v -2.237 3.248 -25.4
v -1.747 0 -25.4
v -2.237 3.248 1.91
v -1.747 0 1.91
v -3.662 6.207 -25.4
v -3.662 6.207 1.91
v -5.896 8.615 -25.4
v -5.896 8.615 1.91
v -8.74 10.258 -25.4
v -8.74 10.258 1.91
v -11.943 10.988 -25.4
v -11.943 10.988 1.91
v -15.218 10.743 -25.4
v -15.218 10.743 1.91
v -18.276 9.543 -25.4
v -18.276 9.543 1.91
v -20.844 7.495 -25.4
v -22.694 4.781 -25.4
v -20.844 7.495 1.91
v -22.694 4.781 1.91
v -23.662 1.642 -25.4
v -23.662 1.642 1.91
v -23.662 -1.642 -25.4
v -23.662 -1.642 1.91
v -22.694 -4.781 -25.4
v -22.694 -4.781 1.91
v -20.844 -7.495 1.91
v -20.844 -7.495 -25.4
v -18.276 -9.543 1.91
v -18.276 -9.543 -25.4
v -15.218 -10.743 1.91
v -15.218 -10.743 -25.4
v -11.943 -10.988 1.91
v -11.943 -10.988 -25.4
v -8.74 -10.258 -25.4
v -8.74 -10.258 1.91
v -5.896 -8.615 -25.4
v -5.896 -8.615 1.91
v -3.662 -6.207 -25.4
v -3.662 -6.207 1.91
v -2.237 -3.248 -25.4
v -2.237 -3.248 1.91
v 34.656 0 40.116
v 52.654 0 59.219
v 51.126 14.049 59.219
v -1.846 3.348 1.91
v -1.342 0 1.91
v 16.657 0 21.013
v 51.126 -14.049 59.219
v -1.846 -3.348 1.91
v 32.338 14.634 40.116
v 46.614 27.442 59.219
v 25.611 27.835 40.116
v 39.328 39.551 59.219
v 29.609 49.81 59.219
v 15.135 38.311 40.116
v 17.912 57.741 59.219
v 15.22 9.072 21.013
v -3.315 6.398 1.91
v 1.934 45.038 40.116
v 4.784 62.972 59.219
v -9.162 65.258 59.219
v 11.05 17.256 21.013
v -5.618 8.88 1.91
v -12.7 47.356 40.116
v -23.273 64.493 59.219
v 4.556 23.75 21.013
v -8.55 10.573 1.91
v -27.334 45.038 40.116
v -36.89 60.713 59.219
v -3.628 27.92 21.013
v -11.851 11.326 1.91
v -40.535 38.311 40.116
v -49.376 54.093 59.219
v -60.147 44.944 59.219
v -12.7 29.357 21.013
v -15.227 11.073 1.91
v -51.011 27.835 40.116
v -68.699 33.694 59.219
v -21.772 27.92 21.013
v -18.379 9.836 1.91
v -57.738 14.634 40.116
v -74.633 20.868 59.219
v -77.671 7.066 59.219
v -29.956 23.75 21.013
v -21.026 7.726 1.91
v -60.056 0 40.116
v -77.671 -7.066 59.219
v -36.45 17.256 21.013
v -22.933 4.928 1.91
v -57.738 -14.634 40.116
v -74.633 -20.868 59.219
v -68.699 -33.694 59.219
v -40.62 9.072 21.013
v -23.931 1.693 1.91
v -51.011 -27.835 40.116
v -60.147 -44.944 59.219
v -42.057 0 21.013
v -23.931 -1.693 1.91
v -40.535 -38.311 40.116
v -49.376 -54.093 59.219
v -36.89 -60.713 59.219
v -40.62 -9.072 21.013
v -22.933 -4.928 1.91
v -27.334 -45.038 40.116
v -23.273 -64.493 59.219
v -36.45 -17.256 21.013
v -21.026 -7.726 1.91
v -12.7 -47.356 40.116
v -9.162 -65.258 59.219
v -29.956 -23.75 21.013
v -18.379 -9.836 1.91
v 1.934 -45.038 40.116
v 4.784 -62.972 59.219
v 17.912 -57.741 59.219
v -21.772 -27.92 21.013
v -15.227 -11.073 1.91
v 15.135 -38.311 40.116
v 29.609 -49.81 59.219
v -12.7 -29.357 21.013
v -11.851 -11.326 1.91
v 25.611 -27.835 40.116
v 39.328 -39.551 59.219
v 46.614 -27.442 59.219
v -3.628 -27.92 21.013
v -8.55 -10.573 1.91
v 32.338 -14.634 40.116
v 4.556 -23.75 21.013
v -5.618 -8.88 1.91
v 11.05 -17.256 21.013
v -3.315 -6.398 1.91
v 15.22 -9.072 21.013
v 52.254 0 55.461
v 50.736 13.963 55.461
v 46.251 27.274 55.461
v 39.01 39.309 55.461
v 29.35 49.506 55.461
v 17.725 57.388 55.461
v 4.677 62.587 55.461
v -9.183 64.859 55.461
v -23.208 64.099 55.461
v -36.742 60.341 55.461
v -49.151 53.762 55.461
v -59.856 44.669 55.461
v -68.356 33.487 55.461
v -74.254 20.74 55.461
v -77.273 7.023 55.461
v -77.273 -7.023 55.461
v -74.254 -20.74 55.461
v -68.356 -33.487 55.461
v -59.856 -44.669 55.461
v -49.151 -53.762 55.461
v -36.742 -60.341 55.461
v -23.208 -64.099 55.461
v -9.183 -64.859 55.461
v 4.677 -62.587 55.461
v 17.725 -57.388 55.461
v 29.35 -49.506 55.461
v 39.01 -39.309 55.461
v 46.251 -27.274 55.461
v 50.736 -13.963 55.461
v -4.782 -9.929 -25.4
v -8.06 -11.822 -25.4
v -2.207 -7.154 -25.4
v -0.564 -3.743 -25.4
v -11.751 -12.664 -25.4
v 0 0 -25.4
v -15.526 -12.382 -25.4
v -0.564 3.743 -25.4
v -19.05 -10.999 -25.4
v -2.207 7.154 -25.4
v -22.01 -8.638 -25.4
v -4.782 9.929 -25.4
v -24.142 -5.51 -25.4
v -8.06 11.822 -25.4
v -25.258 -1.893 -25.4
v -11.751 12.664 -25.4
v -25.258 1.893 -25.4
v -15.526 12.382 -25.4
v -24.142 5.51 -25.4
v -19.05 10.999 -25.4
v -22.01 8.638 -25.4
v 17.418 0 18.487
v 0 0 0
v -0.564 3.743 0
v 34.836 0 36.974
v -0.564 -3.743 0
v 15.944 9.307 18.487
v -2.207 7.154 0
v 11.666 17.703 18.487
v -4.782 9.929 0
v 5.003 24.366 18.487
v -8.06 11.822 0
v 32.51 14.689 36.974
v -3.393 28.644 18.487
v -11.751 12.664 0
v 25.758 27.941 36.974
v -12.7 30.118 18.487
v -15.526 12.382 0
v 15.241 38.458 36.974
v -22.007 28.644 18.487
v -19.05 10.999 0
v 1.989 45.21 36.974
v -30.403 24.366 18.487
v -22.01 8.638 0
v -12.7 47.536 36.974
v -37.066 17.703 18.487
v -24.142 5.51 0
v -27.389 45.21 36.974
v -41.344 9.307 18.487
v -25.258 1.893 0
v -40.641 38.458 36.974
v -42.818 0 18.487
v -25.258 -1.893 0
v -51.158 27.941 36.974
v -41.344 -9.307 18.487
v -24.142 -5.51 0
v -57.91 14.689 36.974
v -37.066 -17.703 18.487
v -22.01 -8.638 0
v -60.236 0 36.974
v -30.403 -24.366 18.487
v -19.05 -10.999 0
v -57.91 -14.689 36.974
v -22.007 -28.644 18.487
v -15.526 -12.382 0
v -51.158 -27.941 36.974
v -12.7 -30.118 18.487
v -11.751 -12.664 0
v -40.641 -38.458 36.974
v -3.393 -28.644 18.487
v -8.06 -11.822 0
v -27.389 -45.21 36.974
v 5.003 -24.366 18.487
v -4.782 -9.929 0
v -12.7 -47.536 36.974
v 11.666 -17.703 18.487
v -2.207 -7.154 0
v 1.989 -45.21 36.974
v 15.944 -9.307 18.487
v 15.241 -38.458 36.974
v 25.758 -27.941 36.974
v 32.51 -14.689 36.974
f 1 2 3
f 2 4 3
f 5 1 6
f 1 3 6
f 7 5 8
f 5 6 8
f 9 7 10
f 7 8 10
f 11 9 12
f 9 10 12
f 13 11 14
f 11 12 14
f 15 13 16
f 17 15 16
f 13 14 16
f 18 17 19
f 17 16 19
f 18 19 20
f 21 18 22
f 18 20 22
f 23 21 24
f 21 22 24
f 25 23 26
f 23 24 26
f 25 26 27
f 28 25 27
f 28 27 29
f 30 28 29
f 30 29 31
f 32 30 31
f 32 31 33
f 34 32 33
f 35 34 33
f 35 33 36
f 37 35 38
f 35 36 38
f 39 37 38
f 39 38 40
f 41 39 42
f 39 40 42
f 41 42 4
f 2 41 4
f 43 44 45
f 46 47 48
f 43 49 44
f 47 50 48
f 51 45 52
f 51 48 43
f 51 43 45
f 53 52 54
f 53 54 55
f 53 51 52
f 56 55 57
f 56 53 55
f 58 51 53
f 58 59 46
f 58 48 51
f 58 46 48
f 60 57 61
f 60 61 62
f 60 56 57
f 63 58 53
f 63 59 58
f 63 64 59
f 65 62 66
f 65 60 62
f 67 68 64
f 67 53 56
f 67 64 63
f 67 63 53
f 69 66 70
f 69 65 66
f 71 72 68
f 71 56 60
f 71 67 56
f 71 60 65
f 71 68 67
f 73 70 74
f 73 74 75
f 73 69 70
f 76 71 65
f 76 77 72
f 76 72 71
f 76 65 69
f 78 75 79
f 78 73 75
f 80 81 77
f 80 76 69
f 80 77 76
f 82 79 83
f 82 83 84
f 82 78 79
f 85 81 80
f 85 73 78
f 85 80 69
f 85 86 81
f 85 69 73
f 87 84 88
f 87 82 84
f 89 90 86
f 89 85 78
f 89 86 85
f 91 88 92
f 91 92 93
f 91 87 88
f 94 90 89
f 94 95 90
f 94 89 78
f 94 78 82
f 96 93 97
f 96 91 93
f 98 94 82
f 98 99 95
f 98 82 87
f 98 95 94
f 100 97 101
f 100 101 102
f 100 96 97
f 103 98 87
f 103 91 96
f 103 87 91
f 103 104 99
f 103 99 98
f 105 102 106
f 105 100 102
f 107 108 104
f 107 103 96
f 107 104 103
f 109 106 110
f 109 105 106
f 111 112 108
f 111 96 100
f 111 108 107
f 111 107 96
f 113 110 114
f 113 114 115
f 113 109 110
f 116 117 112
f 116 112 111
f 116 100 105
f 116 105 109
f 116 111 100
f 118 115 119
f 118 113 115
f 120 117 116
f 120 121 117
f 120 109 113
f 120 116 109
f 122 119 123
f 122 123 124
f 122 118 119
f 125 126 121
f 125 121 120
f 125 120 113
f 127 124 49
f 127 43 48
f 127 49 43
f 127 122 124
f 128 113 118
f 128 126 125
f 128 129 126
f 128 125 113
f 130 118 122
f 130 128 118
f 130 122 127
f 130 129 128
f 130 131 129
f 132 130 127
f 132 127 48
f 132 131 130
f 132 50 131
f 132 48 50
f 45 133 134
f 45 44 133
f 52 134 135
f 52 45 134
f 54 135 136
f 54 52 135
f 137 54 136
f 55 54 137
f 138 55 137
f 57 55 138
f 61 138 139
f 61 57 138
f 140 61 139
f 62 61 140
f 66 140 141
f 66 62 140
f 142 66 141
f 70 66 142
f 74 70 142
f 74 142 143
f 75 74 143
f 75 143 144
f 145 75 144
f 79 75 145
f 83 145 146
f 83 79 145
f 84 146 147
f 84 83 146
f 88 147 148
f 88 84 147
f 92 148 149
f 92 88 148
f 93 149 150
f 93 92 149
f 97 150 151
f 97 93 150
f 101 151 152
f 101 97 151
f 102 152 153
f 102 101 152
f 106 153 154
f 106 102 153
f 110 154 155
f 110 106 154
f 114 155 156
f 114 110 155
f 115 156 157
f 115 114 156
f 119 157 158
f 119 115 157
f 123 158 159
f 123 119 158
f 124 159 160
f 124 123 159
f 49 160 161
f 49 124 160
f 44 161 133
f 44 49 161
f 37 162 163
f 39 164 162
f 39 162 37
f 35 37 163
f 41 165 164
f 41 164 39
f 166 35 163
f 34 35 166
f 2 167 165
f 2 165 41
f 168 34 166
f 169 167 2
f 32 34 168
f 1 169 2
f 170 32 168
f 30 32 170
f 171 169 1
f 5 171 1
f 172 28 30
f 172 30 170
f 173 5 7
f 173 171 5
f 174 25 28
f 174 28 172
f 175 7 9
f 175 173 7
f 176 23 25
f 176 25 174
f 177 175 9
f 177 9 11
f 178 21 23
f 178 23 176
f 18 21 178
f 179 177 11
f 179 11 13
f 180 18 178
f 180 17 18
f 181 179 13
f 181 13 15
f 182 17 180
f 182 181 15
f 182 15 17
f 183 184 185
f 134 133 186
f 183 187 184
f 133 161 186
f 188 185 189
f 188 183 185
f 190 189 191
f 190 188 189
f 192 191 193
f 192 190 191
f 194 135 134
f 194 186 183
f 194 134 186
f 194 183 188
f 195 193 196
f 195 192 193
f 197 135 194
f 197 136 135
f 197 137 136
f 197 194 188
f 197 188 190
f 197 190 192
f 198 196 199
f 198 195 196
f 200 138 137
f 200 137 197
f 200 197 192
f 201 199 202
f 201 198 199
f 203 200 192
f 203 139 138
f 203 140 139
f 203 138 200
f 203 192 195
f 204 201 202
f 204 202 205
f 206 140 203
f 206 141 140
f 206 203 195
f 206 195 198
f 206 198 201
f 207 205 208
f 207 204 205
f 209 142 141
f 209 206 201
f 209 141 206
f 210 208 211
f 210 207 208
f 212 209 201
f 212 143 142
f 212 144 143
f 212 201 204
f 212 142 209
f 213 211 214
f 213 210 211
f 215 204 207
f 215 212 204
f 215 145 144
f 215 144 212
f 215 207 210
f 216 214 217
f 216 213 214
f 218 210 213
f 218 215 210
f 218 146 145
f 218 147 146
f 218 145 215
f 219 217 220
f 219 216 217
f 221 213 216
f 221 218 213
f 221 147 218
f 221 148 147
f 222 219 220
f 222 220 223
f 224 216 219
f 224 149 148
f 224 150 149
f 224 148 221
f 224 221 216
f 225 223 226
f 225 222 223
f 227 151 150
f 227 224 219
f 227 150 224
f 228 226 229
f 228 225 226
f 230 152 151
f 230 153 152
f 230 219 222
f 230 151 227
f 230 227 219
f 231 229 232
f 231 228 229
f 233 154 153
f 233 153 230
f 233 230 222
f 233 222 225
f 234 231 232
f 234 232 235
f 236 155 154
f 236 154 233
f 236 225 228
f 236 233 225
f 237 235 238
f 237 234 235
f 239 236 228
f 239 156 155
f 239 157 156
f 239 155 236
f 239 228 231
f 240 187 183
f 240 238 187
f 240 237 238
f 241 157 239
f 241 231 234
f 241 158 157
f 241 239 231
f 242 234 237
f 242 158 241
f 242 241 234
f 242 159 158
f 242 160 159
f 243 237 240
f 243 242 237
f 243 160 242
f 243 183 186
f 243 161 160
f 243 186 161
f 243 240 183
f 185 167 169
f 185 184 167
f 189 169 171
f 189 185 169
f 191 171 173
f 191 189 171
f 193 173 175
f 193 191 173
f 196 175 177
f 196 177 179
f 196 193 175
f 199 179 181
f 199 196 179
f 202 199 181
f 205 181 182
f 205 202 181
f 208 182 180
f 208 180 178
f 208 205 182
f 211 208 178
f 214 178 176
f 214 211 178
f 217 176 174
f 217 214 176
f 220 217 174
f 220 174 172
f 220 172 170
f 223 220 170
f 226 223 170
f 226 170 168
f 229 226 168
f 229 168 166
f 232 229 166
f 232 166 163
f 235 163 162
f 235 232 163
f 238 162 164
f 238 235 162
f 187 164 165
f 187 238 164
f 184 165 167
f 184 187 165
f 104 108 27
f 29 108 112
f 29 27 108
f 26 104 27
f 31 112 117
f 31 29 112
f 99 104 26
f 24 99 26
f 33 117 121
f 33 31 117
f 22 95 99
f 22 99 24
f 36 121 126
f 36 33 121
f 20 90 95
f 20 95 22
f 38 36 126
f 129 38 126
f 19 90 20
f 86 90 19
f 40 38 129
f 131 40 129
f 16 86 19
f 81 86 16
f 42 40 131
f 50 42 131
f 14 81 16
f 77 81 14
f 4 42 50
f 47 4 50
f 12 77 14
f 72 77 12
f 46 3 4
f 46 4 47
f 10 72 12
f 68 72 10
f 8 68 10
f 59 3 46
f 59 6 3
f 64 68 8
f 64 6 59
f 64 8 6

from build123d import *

# Parameters (mm, degrees)
F2_R     = 11.019259
F3_DEPTH = 50.8
F4_DEPTH = 25.4


with BuildPart() as f1:
    # F0 (on Front) → F1 (revolve)
    with BuildSketch(Plane.XZ):
        Polygon((0, -25.4), (0, 0), (52.254206, 55.461139), (52.654178, 59.21939), (-1.341835, 1.909547), (-12.7, 1.909547), (-12.7, -25.4), align=None)
    revolve(axis=Axis((-12.7, 0, -11.745227), (0, 0, 1)))

    # F2 (on Top) → F3 (cut)
    with BuildSketch(Plane.XY):
        with Locations((-12.766276, 0)):
            Circle(F2_R)
    extrude(amount=-F3_DEPTH, mode=Mode.SUBTRACT)

    # F2 (on Top) → F4 (cut)
    with BuildSketch(Plane.XY):
        with Locations((-12.766276, 0)):
            Circle(F2_R)
    extrude(amount=F4_DEPTH, mode=Mode.SUBTRACT)


solid = f1.part
